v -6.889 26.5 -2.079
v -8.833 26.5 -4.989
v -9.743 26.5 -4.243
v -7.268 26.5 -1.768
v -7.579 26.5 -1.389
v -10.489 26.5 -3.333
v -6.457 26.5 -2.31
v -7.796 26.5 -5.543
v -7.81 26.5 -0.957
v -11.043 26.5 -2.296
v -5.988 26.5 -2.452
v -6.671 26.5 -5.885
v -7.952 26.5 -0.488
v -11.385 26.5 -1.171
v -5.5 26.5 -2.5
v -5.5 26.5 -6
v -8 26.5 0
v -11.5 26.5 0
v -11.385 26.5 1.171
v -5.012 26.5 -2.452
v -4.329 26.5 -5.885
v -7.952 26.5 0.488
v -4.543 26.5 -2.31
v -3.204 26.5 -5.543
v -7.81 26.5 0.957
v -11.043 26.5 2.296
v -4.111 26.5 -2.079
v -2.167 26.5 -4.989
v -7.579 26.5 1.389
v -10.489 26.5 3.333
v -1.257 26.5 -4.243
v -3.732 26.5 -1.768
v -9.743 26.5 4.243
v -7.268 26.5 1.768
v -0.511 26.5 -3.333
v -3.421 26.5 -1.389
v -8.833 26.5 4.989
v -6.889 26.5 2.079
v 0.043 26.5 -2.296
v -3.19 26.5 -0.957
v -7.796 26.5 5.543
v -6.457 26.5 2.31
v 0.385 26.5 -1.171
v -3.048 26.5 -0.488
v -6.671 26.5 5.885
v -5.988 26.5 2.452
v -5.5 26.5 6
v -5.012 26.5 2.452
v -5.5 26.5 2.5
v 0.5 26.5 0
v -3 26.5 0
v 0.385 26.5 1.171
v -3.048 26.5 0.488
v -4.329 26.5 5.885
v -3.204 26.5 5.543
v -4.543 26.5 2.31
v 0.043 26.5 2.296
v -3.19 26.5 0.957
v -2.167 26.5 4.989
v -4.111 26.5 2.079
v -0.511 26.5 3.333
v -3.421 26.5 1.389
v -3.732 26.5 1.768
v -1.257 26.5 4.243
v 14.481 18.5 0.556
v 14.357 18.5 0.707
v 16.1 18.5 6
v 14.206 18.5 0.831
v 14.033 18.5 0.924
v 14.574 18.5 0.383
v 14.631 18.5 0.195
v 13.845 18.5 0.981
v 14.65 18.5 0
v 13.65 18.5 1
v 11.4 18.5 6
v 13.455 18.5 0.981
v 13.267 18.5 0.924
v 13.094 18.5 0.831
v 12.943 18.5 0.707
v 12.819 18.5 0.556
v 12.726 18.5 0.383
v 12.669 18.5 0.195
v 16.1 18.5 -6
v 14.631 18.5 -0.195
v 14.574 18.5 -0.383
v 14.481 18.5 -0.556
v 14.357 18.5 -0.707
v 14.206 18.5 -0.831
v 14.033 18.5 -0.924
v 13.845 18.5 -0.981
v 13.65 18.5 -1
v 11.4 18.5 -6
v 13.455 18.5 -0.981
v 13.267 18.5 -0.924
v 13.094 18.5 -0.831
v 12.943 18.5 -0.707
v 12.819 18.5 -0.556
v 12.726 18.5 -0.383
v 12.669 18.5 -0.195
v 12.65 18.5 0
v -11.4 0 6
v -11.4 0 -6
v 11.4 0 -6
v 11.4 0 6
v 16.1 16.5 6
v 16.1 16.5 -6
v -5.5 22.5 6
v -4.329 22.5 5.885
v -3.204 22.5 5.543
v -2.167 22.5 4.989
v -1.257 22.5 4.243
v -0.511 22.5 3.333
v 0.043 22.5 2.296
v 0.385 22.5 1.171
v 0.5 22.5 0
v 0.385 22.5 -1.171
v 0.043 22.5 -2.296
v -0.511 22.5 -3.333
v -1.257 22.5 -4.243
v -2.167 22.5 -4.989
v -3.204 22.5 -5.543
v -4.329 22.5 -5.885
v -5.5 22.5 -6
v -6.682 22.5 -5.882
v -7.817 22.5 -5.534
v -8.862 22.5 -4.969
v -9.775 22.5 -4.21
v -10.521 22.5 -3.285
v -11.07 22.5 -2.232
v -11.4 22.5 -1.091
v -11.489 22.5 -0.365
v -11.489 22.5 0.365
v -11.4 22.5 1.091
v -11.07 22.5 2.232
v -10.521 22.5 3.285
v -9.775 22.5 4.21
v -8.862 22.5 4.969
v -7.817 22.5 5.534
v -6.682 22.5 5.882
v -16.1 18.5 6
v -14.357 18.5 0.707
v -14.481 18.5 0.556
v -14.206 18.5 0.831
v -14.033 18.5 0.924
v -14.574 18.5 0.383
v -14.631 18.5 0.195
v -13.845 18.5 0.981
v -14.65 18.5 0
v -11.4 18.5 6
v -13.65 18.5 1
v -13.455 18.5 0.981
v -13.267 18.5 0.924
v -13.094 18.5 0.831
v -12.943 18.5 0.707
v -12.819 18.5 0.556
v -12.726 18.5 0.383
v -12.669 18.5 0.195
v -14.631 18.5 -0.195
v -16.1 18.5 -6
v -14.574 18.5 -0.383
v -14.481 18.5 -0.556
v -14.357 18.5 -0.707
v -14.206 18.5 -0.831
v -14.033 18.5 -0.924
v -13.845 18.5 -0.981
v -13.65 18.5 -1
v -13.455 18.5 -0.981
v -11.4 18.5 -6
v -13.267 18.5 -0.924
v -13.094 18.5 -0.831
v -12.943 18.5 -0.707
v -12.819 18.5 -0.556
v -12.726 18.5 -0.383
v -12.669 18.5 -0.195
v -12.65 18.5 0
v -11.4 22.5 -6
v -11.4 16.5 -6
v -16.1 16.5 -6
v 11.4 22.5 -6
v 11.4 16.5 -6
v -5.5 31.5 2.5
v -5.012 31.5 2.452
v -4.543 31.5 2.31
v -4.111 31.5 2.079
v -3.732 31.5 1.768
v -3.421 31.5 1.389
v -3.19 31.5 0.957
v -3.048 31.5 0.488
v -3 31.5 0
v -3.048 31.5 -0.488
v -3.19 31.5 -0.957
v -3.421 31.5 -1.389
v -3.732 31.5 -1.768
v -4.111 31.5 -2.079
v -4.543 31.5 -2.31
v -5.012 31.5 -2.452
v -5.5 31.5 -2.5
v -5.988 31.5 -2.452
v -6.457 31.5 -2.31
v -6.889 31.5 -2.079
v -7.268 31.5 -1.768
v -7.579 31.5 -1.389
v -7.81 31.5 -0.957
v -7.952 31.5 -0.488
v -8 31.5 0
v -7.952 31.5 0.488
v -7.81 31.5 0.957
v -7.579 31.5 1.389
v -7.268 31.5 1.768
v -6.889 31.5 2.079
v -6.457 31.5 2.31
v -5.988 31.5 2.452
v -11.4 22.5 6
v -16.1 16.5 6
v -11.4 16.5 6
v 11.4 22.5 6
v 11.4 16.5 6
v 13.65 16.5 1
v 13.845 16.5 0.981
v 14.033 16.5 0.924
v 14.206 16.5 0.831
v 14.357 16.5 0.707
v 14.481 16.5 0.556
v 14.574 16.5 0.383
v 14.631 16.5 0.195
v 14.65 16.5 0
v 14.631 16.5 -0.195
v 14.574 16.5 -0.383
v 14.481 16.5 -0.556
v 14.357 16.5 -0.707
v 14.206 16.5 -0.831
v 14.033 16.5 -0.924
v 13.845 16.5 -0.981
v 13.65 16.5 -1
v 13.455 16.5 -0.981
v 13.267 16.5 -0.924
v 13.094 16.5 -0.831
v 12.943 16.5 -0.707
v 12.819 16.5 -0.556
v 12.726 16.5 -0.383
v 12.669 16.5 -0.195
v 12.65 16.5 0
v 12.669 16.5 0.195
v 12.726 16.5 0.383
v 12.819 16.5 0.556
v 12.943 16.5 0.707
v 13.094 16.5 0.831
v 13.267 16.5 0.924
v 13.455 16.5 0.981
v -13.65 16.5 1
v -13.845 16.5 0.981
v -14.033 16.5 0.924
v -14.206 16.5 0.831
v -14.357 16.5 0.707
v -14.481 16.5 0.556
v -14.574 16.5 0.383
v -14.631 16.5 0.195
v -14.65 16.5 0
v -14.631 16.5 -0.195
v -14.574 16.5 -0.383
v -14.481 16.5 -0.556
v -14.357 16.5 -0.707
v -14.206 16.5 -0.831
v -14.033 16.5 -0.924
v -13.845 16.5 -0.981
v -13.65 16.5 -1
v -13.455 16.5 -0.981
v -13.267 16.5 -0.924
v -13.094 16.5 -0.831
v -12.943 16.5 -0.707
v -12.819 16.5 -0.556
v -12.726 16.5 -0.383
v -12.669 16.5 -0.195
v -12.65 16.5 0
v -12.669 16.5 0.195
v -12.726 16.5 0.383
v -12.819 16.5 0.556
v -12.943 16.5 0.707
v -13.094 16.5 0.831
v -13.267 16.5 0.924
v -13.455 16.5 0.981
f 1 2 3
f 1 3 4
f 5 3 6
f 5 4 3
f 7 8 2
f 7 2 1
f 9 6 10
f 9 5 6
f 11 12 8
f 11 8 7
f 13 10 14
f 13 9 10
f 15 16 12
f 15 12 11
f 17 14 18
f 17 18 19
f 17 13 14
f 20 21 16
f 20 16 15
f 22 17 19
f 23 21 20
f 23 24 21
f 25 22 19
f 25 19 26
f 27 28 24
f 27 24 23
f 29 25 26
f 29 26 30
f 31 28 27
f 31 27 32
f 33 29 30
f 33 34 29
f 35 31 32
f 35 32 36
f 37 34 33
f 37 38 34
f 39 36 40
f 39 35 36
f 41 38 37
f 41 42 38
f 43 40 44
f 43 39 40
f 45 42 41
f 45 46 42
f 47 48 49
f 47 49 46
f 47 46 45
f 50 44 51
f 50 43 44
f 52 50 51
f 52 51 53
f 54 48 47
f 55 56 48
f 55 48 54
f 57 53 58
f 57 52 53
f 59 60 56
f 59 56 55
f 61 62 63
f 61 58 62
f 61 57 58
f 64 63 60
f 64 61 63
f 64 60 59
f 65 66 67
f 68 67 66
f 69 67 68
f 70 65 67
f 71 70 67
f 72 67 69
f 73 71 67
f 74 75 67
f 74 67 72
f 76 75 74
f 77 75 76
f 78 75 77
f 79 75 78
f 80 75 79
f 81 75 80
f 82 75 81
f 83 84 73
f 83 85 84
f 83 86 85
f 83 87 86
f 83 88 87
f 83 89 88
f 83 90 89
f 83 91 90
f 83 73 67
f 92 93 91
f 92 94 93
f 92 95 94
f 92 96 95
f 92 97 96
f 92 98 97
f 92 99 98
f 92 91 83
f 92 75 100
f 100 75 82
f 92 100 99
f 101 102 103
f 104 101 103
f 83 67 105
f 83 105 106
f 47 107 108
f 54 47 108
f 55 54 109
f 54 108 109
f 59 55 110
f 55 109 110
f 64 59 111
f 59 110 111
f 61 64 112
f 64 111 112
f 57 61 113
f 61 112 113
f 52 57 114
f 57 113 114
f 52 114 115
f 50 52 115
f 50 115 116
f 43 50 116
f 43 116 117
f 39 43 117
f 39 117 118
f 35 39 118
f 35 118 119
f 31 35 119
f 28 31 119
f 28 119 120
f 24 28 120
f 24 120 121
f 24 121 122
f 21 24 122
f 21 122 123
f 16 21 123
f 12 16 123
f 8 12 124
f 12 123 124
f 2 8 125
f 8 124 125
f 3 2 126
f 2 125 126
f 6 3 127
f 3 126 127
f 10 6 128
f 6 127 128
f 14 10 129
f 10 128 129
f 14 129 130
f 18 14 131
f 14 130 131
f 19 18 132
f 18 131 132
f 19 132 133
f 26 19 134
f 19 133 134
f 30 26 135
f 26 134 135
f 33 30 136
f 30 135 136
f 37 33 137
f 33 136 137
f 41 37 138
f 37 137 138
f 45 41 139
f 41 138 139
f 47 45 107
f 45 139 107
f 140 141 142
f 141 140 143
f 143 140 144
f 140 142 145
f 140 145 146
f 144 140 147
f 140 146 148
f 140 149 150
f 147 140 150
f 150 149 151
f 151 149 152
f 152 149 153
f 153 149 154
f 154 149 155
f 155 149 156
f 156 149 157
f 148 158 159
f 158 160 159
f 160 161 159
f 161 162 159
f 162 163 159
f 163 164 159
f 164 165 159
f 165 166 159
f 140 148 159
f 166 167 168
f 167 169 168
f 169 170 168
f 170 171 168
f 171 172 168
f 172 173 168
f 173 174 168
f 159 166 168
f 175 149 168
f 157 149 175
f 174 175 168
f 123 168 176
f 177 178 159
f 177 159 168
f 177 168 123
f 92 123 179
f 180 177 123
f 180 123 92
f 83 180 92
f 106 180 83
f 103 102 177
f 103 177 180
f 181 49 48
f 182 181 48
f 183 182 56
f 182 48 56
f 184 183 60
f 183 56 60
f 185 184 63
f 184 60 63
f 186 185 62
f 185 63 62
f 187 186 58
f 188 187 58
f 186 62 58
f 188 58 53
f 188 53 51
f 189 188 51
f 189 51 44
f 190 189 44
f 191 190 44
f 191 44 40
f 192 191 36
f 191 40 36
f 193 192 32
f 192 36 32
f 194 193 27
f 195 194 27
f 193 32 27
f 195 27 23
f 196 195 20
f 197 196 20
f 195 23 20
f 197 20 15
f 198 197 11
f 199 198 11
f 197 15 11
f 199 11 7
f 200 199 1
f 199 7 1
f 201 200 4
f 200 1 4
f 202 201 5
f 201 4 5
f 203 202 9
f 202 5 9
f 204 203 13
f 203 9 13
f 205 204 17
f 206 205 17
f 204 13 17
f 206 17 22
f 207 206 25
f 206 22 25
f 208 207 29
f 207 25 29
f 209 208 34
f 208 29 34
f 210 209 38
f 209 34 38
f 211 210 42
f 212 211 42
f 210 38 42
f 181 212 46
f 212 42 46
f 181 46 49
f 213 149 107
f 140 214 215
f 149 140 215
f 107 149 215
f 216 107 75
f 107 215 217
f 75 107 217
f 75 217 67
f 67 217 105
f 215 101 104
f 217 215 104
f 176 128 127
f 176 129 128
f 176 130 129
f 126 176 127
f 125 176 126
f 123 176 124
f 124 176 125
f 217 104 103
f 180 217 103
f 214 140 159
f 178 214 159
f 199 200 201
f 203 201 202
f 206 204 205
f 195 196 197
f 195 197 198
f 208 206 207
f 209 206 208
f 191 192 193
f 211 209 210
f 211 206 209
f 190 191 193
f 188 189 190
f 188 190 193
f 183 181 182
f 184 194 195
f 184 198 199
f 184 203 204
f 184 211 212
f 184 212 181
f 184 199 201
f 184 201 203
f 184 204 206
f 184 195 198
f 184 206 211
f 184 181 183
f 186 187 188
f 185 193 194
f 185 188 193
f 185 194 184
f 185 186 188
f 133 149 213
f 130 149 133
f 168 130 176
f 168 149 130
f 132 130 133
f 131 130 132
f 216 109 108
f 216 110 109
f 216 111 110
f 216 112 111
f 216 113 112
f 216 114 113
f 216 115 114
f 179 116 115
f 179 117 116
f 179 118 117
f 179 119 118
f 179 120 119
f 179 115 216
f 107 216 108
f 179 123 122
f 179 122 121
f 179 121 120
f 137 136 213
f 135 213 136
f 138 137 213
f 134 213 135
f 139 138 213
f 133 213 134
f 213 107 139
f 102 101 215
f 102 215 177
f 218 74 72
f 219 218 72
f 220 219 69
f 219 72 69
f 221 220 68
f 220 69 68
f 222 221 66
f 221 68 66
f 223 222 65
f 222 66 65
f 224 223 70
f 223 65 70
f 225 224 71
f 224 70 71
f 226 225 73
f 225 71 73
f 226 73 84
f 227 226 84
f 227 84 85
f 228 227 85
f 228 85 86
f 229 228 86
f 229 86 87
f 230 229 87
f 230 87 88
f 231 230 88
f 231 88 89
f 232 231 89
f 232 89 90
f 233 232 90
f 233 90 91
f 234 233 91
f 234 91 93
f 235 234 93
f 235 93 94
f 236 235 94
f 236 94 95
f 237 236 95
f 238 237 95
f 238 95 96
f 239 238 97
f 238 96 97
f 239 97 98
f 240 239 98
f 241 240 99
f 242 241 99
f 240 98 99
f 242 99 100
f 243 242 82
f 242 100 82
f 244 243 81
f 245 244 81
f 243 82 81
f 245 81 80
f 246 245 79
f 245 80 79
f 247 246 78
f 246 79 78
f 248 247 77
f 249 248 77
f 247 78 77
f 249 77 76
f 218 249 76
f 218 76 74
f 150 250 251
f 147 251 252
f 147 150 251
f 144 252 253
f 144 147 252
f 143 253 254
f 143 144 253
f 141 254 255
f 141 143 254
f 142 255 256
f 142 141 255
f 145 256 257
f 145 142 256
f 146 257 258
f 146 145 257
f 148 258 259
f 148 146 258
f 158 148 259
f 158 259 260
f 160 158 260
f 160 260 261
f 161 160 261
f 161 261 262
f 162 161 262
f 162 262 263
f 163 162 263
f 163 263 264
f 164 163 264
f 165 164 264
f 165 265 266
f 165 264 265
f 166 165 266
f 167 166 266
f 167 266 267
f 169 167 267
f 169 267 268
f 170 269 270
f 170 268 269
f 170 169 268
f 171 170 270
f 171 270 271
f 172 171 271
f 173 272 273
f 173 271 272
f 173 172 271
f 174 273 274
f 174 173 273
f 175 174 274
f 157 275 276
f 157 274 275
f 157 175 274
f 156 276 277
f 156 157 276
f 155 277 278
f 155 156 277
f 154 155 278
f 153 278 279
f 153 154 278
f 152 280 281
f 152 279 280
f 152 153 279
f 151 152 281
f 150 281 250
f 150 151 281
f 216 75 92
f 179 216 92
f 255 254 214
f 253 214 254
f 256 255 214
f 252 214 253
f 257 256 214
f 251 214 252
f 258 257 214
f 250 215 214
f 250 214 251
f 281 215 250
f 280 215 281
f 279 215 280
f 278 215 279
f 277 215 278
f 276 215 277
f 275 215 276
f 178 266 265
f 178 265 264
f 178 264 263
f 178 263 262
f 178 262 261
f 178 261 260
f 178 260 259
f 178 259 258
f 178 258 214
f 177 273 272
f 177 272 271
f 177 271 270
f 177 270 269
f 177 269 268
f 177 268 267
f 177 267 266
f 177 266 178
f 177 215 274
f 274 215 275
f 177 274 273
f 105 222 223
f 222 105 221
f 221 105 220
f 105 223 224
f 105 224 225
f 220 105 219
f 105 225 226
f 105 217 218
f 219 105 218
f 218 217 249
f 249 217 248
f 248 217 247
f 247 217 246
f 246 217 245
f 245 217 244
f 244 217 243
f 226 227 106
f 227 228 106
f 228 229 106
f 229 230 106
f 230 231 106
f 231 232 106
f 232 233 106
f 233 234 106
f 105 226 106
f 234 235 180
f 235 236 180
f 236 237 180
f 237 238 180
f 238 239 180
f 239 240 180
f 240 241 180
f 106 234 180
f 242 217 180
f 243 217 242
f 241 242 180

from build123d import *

# Parameters (mm, degrees)
SKETCH1_W           = 22.8
SKETCH1_H           = 12
BOSS_EXTRUDE1_DEPTH = 22.5
SKETCH2_W           = 12
SKETCH2_H           = 2
BOSS_EXTRUDE2_DEPTH = 4.7
SKETCH3_R           = 6
BOSS_EXTRUDE3_DEPTH = 4
SKETCH4_R           = 2.5
BOSS_EXTRUDE4_DEPTH = 5
SKETCH5_R           = 1
CUT_EXTRUDE1_DEPTH  = 5


with BuildPart() as part:
    # Sketch1 → Boss-Extrude1 (new body)
    with BuildSketch(Plane(origin=(0, 0, 0), x_dir=(1, 0, 0), z_dir=(0, 1, 0))):
        Rectangle(SKETCH1_W, SKETCH1_H)
    extrude(amount=BOSS_EXTRUDE1_DEPTH)

    # Sketch2 → Boss-Extrude2 (add)
    with BuildSketch(Plane(origin=(11.4, 0, 0), x_dir=(0, 0, -1), z_dir=(1, 0, 0))):
        with Locations((0, 17.5)):
            Rectangle(SKETCH2_W, SKETCH2_H)
    boss_extrude2 = extrude(amount=BOSS_EXTRUDE2_DEPTH)

    # Mirror1: Boss-Extrude2 across plane
    add(boss_extrude2.mirror(Plane(origin=(0, 0, 0), x_dir=(0, 0, 1), z_dir=(1, 0, 0))))

    # Sketch3 → Boss-Extrude3 (add)
    with BuildSketch(Plane(origin=(0, 22.5, 0), x_dir=(1, 0, 0), z_dir=(0, 1, 0))):
        with Locations(Location((-5.5, 0, 0), (0, 0, 270))):
            Circle(SKETCH3_R)
    extrude(amount=BOSS_EXTRUDE3_DEPTH)

    # Sketch4 → Boss-Extrude4 (add)
    with BuildSketch(Plane(origin=(0, 26.5, 0), x_dir=(1, 0, 0), z_dir=(0, 1, 0))):
        with Locations(Location((-5.5, 0, 0), (0, 0, 270))):
            Circle(SKETCH4_R)
    extrude(amount=BOSS_EXTRUDE4_DEPTH)

    # Sketch5 → Cut-Extrude1 (cut)
    with BuildSketch(Plane(origin=(0, 18.5, 0), x_dir=(1, 0, 0), z_dir=(0, 1, 0))):
        with Locations(Location((13.65, 0, 0), (0, 0, 270))):
            Circle(SKETCH5_R)
    cut_extrude1 = extrude(amount=-CUT_EXTRUDE1_DEPTH, mode=Mode.SUBTRACT)

    # Mirror2: Cut-Extrude1 across plane
    add(cut_extrude1.mirror(Plane(origin=(0, 0, 0), x_dir=(0, 0, 1), z_dir=(1, 0, 0))), mode=Mode.SUBTRACT)


solid = part.part
